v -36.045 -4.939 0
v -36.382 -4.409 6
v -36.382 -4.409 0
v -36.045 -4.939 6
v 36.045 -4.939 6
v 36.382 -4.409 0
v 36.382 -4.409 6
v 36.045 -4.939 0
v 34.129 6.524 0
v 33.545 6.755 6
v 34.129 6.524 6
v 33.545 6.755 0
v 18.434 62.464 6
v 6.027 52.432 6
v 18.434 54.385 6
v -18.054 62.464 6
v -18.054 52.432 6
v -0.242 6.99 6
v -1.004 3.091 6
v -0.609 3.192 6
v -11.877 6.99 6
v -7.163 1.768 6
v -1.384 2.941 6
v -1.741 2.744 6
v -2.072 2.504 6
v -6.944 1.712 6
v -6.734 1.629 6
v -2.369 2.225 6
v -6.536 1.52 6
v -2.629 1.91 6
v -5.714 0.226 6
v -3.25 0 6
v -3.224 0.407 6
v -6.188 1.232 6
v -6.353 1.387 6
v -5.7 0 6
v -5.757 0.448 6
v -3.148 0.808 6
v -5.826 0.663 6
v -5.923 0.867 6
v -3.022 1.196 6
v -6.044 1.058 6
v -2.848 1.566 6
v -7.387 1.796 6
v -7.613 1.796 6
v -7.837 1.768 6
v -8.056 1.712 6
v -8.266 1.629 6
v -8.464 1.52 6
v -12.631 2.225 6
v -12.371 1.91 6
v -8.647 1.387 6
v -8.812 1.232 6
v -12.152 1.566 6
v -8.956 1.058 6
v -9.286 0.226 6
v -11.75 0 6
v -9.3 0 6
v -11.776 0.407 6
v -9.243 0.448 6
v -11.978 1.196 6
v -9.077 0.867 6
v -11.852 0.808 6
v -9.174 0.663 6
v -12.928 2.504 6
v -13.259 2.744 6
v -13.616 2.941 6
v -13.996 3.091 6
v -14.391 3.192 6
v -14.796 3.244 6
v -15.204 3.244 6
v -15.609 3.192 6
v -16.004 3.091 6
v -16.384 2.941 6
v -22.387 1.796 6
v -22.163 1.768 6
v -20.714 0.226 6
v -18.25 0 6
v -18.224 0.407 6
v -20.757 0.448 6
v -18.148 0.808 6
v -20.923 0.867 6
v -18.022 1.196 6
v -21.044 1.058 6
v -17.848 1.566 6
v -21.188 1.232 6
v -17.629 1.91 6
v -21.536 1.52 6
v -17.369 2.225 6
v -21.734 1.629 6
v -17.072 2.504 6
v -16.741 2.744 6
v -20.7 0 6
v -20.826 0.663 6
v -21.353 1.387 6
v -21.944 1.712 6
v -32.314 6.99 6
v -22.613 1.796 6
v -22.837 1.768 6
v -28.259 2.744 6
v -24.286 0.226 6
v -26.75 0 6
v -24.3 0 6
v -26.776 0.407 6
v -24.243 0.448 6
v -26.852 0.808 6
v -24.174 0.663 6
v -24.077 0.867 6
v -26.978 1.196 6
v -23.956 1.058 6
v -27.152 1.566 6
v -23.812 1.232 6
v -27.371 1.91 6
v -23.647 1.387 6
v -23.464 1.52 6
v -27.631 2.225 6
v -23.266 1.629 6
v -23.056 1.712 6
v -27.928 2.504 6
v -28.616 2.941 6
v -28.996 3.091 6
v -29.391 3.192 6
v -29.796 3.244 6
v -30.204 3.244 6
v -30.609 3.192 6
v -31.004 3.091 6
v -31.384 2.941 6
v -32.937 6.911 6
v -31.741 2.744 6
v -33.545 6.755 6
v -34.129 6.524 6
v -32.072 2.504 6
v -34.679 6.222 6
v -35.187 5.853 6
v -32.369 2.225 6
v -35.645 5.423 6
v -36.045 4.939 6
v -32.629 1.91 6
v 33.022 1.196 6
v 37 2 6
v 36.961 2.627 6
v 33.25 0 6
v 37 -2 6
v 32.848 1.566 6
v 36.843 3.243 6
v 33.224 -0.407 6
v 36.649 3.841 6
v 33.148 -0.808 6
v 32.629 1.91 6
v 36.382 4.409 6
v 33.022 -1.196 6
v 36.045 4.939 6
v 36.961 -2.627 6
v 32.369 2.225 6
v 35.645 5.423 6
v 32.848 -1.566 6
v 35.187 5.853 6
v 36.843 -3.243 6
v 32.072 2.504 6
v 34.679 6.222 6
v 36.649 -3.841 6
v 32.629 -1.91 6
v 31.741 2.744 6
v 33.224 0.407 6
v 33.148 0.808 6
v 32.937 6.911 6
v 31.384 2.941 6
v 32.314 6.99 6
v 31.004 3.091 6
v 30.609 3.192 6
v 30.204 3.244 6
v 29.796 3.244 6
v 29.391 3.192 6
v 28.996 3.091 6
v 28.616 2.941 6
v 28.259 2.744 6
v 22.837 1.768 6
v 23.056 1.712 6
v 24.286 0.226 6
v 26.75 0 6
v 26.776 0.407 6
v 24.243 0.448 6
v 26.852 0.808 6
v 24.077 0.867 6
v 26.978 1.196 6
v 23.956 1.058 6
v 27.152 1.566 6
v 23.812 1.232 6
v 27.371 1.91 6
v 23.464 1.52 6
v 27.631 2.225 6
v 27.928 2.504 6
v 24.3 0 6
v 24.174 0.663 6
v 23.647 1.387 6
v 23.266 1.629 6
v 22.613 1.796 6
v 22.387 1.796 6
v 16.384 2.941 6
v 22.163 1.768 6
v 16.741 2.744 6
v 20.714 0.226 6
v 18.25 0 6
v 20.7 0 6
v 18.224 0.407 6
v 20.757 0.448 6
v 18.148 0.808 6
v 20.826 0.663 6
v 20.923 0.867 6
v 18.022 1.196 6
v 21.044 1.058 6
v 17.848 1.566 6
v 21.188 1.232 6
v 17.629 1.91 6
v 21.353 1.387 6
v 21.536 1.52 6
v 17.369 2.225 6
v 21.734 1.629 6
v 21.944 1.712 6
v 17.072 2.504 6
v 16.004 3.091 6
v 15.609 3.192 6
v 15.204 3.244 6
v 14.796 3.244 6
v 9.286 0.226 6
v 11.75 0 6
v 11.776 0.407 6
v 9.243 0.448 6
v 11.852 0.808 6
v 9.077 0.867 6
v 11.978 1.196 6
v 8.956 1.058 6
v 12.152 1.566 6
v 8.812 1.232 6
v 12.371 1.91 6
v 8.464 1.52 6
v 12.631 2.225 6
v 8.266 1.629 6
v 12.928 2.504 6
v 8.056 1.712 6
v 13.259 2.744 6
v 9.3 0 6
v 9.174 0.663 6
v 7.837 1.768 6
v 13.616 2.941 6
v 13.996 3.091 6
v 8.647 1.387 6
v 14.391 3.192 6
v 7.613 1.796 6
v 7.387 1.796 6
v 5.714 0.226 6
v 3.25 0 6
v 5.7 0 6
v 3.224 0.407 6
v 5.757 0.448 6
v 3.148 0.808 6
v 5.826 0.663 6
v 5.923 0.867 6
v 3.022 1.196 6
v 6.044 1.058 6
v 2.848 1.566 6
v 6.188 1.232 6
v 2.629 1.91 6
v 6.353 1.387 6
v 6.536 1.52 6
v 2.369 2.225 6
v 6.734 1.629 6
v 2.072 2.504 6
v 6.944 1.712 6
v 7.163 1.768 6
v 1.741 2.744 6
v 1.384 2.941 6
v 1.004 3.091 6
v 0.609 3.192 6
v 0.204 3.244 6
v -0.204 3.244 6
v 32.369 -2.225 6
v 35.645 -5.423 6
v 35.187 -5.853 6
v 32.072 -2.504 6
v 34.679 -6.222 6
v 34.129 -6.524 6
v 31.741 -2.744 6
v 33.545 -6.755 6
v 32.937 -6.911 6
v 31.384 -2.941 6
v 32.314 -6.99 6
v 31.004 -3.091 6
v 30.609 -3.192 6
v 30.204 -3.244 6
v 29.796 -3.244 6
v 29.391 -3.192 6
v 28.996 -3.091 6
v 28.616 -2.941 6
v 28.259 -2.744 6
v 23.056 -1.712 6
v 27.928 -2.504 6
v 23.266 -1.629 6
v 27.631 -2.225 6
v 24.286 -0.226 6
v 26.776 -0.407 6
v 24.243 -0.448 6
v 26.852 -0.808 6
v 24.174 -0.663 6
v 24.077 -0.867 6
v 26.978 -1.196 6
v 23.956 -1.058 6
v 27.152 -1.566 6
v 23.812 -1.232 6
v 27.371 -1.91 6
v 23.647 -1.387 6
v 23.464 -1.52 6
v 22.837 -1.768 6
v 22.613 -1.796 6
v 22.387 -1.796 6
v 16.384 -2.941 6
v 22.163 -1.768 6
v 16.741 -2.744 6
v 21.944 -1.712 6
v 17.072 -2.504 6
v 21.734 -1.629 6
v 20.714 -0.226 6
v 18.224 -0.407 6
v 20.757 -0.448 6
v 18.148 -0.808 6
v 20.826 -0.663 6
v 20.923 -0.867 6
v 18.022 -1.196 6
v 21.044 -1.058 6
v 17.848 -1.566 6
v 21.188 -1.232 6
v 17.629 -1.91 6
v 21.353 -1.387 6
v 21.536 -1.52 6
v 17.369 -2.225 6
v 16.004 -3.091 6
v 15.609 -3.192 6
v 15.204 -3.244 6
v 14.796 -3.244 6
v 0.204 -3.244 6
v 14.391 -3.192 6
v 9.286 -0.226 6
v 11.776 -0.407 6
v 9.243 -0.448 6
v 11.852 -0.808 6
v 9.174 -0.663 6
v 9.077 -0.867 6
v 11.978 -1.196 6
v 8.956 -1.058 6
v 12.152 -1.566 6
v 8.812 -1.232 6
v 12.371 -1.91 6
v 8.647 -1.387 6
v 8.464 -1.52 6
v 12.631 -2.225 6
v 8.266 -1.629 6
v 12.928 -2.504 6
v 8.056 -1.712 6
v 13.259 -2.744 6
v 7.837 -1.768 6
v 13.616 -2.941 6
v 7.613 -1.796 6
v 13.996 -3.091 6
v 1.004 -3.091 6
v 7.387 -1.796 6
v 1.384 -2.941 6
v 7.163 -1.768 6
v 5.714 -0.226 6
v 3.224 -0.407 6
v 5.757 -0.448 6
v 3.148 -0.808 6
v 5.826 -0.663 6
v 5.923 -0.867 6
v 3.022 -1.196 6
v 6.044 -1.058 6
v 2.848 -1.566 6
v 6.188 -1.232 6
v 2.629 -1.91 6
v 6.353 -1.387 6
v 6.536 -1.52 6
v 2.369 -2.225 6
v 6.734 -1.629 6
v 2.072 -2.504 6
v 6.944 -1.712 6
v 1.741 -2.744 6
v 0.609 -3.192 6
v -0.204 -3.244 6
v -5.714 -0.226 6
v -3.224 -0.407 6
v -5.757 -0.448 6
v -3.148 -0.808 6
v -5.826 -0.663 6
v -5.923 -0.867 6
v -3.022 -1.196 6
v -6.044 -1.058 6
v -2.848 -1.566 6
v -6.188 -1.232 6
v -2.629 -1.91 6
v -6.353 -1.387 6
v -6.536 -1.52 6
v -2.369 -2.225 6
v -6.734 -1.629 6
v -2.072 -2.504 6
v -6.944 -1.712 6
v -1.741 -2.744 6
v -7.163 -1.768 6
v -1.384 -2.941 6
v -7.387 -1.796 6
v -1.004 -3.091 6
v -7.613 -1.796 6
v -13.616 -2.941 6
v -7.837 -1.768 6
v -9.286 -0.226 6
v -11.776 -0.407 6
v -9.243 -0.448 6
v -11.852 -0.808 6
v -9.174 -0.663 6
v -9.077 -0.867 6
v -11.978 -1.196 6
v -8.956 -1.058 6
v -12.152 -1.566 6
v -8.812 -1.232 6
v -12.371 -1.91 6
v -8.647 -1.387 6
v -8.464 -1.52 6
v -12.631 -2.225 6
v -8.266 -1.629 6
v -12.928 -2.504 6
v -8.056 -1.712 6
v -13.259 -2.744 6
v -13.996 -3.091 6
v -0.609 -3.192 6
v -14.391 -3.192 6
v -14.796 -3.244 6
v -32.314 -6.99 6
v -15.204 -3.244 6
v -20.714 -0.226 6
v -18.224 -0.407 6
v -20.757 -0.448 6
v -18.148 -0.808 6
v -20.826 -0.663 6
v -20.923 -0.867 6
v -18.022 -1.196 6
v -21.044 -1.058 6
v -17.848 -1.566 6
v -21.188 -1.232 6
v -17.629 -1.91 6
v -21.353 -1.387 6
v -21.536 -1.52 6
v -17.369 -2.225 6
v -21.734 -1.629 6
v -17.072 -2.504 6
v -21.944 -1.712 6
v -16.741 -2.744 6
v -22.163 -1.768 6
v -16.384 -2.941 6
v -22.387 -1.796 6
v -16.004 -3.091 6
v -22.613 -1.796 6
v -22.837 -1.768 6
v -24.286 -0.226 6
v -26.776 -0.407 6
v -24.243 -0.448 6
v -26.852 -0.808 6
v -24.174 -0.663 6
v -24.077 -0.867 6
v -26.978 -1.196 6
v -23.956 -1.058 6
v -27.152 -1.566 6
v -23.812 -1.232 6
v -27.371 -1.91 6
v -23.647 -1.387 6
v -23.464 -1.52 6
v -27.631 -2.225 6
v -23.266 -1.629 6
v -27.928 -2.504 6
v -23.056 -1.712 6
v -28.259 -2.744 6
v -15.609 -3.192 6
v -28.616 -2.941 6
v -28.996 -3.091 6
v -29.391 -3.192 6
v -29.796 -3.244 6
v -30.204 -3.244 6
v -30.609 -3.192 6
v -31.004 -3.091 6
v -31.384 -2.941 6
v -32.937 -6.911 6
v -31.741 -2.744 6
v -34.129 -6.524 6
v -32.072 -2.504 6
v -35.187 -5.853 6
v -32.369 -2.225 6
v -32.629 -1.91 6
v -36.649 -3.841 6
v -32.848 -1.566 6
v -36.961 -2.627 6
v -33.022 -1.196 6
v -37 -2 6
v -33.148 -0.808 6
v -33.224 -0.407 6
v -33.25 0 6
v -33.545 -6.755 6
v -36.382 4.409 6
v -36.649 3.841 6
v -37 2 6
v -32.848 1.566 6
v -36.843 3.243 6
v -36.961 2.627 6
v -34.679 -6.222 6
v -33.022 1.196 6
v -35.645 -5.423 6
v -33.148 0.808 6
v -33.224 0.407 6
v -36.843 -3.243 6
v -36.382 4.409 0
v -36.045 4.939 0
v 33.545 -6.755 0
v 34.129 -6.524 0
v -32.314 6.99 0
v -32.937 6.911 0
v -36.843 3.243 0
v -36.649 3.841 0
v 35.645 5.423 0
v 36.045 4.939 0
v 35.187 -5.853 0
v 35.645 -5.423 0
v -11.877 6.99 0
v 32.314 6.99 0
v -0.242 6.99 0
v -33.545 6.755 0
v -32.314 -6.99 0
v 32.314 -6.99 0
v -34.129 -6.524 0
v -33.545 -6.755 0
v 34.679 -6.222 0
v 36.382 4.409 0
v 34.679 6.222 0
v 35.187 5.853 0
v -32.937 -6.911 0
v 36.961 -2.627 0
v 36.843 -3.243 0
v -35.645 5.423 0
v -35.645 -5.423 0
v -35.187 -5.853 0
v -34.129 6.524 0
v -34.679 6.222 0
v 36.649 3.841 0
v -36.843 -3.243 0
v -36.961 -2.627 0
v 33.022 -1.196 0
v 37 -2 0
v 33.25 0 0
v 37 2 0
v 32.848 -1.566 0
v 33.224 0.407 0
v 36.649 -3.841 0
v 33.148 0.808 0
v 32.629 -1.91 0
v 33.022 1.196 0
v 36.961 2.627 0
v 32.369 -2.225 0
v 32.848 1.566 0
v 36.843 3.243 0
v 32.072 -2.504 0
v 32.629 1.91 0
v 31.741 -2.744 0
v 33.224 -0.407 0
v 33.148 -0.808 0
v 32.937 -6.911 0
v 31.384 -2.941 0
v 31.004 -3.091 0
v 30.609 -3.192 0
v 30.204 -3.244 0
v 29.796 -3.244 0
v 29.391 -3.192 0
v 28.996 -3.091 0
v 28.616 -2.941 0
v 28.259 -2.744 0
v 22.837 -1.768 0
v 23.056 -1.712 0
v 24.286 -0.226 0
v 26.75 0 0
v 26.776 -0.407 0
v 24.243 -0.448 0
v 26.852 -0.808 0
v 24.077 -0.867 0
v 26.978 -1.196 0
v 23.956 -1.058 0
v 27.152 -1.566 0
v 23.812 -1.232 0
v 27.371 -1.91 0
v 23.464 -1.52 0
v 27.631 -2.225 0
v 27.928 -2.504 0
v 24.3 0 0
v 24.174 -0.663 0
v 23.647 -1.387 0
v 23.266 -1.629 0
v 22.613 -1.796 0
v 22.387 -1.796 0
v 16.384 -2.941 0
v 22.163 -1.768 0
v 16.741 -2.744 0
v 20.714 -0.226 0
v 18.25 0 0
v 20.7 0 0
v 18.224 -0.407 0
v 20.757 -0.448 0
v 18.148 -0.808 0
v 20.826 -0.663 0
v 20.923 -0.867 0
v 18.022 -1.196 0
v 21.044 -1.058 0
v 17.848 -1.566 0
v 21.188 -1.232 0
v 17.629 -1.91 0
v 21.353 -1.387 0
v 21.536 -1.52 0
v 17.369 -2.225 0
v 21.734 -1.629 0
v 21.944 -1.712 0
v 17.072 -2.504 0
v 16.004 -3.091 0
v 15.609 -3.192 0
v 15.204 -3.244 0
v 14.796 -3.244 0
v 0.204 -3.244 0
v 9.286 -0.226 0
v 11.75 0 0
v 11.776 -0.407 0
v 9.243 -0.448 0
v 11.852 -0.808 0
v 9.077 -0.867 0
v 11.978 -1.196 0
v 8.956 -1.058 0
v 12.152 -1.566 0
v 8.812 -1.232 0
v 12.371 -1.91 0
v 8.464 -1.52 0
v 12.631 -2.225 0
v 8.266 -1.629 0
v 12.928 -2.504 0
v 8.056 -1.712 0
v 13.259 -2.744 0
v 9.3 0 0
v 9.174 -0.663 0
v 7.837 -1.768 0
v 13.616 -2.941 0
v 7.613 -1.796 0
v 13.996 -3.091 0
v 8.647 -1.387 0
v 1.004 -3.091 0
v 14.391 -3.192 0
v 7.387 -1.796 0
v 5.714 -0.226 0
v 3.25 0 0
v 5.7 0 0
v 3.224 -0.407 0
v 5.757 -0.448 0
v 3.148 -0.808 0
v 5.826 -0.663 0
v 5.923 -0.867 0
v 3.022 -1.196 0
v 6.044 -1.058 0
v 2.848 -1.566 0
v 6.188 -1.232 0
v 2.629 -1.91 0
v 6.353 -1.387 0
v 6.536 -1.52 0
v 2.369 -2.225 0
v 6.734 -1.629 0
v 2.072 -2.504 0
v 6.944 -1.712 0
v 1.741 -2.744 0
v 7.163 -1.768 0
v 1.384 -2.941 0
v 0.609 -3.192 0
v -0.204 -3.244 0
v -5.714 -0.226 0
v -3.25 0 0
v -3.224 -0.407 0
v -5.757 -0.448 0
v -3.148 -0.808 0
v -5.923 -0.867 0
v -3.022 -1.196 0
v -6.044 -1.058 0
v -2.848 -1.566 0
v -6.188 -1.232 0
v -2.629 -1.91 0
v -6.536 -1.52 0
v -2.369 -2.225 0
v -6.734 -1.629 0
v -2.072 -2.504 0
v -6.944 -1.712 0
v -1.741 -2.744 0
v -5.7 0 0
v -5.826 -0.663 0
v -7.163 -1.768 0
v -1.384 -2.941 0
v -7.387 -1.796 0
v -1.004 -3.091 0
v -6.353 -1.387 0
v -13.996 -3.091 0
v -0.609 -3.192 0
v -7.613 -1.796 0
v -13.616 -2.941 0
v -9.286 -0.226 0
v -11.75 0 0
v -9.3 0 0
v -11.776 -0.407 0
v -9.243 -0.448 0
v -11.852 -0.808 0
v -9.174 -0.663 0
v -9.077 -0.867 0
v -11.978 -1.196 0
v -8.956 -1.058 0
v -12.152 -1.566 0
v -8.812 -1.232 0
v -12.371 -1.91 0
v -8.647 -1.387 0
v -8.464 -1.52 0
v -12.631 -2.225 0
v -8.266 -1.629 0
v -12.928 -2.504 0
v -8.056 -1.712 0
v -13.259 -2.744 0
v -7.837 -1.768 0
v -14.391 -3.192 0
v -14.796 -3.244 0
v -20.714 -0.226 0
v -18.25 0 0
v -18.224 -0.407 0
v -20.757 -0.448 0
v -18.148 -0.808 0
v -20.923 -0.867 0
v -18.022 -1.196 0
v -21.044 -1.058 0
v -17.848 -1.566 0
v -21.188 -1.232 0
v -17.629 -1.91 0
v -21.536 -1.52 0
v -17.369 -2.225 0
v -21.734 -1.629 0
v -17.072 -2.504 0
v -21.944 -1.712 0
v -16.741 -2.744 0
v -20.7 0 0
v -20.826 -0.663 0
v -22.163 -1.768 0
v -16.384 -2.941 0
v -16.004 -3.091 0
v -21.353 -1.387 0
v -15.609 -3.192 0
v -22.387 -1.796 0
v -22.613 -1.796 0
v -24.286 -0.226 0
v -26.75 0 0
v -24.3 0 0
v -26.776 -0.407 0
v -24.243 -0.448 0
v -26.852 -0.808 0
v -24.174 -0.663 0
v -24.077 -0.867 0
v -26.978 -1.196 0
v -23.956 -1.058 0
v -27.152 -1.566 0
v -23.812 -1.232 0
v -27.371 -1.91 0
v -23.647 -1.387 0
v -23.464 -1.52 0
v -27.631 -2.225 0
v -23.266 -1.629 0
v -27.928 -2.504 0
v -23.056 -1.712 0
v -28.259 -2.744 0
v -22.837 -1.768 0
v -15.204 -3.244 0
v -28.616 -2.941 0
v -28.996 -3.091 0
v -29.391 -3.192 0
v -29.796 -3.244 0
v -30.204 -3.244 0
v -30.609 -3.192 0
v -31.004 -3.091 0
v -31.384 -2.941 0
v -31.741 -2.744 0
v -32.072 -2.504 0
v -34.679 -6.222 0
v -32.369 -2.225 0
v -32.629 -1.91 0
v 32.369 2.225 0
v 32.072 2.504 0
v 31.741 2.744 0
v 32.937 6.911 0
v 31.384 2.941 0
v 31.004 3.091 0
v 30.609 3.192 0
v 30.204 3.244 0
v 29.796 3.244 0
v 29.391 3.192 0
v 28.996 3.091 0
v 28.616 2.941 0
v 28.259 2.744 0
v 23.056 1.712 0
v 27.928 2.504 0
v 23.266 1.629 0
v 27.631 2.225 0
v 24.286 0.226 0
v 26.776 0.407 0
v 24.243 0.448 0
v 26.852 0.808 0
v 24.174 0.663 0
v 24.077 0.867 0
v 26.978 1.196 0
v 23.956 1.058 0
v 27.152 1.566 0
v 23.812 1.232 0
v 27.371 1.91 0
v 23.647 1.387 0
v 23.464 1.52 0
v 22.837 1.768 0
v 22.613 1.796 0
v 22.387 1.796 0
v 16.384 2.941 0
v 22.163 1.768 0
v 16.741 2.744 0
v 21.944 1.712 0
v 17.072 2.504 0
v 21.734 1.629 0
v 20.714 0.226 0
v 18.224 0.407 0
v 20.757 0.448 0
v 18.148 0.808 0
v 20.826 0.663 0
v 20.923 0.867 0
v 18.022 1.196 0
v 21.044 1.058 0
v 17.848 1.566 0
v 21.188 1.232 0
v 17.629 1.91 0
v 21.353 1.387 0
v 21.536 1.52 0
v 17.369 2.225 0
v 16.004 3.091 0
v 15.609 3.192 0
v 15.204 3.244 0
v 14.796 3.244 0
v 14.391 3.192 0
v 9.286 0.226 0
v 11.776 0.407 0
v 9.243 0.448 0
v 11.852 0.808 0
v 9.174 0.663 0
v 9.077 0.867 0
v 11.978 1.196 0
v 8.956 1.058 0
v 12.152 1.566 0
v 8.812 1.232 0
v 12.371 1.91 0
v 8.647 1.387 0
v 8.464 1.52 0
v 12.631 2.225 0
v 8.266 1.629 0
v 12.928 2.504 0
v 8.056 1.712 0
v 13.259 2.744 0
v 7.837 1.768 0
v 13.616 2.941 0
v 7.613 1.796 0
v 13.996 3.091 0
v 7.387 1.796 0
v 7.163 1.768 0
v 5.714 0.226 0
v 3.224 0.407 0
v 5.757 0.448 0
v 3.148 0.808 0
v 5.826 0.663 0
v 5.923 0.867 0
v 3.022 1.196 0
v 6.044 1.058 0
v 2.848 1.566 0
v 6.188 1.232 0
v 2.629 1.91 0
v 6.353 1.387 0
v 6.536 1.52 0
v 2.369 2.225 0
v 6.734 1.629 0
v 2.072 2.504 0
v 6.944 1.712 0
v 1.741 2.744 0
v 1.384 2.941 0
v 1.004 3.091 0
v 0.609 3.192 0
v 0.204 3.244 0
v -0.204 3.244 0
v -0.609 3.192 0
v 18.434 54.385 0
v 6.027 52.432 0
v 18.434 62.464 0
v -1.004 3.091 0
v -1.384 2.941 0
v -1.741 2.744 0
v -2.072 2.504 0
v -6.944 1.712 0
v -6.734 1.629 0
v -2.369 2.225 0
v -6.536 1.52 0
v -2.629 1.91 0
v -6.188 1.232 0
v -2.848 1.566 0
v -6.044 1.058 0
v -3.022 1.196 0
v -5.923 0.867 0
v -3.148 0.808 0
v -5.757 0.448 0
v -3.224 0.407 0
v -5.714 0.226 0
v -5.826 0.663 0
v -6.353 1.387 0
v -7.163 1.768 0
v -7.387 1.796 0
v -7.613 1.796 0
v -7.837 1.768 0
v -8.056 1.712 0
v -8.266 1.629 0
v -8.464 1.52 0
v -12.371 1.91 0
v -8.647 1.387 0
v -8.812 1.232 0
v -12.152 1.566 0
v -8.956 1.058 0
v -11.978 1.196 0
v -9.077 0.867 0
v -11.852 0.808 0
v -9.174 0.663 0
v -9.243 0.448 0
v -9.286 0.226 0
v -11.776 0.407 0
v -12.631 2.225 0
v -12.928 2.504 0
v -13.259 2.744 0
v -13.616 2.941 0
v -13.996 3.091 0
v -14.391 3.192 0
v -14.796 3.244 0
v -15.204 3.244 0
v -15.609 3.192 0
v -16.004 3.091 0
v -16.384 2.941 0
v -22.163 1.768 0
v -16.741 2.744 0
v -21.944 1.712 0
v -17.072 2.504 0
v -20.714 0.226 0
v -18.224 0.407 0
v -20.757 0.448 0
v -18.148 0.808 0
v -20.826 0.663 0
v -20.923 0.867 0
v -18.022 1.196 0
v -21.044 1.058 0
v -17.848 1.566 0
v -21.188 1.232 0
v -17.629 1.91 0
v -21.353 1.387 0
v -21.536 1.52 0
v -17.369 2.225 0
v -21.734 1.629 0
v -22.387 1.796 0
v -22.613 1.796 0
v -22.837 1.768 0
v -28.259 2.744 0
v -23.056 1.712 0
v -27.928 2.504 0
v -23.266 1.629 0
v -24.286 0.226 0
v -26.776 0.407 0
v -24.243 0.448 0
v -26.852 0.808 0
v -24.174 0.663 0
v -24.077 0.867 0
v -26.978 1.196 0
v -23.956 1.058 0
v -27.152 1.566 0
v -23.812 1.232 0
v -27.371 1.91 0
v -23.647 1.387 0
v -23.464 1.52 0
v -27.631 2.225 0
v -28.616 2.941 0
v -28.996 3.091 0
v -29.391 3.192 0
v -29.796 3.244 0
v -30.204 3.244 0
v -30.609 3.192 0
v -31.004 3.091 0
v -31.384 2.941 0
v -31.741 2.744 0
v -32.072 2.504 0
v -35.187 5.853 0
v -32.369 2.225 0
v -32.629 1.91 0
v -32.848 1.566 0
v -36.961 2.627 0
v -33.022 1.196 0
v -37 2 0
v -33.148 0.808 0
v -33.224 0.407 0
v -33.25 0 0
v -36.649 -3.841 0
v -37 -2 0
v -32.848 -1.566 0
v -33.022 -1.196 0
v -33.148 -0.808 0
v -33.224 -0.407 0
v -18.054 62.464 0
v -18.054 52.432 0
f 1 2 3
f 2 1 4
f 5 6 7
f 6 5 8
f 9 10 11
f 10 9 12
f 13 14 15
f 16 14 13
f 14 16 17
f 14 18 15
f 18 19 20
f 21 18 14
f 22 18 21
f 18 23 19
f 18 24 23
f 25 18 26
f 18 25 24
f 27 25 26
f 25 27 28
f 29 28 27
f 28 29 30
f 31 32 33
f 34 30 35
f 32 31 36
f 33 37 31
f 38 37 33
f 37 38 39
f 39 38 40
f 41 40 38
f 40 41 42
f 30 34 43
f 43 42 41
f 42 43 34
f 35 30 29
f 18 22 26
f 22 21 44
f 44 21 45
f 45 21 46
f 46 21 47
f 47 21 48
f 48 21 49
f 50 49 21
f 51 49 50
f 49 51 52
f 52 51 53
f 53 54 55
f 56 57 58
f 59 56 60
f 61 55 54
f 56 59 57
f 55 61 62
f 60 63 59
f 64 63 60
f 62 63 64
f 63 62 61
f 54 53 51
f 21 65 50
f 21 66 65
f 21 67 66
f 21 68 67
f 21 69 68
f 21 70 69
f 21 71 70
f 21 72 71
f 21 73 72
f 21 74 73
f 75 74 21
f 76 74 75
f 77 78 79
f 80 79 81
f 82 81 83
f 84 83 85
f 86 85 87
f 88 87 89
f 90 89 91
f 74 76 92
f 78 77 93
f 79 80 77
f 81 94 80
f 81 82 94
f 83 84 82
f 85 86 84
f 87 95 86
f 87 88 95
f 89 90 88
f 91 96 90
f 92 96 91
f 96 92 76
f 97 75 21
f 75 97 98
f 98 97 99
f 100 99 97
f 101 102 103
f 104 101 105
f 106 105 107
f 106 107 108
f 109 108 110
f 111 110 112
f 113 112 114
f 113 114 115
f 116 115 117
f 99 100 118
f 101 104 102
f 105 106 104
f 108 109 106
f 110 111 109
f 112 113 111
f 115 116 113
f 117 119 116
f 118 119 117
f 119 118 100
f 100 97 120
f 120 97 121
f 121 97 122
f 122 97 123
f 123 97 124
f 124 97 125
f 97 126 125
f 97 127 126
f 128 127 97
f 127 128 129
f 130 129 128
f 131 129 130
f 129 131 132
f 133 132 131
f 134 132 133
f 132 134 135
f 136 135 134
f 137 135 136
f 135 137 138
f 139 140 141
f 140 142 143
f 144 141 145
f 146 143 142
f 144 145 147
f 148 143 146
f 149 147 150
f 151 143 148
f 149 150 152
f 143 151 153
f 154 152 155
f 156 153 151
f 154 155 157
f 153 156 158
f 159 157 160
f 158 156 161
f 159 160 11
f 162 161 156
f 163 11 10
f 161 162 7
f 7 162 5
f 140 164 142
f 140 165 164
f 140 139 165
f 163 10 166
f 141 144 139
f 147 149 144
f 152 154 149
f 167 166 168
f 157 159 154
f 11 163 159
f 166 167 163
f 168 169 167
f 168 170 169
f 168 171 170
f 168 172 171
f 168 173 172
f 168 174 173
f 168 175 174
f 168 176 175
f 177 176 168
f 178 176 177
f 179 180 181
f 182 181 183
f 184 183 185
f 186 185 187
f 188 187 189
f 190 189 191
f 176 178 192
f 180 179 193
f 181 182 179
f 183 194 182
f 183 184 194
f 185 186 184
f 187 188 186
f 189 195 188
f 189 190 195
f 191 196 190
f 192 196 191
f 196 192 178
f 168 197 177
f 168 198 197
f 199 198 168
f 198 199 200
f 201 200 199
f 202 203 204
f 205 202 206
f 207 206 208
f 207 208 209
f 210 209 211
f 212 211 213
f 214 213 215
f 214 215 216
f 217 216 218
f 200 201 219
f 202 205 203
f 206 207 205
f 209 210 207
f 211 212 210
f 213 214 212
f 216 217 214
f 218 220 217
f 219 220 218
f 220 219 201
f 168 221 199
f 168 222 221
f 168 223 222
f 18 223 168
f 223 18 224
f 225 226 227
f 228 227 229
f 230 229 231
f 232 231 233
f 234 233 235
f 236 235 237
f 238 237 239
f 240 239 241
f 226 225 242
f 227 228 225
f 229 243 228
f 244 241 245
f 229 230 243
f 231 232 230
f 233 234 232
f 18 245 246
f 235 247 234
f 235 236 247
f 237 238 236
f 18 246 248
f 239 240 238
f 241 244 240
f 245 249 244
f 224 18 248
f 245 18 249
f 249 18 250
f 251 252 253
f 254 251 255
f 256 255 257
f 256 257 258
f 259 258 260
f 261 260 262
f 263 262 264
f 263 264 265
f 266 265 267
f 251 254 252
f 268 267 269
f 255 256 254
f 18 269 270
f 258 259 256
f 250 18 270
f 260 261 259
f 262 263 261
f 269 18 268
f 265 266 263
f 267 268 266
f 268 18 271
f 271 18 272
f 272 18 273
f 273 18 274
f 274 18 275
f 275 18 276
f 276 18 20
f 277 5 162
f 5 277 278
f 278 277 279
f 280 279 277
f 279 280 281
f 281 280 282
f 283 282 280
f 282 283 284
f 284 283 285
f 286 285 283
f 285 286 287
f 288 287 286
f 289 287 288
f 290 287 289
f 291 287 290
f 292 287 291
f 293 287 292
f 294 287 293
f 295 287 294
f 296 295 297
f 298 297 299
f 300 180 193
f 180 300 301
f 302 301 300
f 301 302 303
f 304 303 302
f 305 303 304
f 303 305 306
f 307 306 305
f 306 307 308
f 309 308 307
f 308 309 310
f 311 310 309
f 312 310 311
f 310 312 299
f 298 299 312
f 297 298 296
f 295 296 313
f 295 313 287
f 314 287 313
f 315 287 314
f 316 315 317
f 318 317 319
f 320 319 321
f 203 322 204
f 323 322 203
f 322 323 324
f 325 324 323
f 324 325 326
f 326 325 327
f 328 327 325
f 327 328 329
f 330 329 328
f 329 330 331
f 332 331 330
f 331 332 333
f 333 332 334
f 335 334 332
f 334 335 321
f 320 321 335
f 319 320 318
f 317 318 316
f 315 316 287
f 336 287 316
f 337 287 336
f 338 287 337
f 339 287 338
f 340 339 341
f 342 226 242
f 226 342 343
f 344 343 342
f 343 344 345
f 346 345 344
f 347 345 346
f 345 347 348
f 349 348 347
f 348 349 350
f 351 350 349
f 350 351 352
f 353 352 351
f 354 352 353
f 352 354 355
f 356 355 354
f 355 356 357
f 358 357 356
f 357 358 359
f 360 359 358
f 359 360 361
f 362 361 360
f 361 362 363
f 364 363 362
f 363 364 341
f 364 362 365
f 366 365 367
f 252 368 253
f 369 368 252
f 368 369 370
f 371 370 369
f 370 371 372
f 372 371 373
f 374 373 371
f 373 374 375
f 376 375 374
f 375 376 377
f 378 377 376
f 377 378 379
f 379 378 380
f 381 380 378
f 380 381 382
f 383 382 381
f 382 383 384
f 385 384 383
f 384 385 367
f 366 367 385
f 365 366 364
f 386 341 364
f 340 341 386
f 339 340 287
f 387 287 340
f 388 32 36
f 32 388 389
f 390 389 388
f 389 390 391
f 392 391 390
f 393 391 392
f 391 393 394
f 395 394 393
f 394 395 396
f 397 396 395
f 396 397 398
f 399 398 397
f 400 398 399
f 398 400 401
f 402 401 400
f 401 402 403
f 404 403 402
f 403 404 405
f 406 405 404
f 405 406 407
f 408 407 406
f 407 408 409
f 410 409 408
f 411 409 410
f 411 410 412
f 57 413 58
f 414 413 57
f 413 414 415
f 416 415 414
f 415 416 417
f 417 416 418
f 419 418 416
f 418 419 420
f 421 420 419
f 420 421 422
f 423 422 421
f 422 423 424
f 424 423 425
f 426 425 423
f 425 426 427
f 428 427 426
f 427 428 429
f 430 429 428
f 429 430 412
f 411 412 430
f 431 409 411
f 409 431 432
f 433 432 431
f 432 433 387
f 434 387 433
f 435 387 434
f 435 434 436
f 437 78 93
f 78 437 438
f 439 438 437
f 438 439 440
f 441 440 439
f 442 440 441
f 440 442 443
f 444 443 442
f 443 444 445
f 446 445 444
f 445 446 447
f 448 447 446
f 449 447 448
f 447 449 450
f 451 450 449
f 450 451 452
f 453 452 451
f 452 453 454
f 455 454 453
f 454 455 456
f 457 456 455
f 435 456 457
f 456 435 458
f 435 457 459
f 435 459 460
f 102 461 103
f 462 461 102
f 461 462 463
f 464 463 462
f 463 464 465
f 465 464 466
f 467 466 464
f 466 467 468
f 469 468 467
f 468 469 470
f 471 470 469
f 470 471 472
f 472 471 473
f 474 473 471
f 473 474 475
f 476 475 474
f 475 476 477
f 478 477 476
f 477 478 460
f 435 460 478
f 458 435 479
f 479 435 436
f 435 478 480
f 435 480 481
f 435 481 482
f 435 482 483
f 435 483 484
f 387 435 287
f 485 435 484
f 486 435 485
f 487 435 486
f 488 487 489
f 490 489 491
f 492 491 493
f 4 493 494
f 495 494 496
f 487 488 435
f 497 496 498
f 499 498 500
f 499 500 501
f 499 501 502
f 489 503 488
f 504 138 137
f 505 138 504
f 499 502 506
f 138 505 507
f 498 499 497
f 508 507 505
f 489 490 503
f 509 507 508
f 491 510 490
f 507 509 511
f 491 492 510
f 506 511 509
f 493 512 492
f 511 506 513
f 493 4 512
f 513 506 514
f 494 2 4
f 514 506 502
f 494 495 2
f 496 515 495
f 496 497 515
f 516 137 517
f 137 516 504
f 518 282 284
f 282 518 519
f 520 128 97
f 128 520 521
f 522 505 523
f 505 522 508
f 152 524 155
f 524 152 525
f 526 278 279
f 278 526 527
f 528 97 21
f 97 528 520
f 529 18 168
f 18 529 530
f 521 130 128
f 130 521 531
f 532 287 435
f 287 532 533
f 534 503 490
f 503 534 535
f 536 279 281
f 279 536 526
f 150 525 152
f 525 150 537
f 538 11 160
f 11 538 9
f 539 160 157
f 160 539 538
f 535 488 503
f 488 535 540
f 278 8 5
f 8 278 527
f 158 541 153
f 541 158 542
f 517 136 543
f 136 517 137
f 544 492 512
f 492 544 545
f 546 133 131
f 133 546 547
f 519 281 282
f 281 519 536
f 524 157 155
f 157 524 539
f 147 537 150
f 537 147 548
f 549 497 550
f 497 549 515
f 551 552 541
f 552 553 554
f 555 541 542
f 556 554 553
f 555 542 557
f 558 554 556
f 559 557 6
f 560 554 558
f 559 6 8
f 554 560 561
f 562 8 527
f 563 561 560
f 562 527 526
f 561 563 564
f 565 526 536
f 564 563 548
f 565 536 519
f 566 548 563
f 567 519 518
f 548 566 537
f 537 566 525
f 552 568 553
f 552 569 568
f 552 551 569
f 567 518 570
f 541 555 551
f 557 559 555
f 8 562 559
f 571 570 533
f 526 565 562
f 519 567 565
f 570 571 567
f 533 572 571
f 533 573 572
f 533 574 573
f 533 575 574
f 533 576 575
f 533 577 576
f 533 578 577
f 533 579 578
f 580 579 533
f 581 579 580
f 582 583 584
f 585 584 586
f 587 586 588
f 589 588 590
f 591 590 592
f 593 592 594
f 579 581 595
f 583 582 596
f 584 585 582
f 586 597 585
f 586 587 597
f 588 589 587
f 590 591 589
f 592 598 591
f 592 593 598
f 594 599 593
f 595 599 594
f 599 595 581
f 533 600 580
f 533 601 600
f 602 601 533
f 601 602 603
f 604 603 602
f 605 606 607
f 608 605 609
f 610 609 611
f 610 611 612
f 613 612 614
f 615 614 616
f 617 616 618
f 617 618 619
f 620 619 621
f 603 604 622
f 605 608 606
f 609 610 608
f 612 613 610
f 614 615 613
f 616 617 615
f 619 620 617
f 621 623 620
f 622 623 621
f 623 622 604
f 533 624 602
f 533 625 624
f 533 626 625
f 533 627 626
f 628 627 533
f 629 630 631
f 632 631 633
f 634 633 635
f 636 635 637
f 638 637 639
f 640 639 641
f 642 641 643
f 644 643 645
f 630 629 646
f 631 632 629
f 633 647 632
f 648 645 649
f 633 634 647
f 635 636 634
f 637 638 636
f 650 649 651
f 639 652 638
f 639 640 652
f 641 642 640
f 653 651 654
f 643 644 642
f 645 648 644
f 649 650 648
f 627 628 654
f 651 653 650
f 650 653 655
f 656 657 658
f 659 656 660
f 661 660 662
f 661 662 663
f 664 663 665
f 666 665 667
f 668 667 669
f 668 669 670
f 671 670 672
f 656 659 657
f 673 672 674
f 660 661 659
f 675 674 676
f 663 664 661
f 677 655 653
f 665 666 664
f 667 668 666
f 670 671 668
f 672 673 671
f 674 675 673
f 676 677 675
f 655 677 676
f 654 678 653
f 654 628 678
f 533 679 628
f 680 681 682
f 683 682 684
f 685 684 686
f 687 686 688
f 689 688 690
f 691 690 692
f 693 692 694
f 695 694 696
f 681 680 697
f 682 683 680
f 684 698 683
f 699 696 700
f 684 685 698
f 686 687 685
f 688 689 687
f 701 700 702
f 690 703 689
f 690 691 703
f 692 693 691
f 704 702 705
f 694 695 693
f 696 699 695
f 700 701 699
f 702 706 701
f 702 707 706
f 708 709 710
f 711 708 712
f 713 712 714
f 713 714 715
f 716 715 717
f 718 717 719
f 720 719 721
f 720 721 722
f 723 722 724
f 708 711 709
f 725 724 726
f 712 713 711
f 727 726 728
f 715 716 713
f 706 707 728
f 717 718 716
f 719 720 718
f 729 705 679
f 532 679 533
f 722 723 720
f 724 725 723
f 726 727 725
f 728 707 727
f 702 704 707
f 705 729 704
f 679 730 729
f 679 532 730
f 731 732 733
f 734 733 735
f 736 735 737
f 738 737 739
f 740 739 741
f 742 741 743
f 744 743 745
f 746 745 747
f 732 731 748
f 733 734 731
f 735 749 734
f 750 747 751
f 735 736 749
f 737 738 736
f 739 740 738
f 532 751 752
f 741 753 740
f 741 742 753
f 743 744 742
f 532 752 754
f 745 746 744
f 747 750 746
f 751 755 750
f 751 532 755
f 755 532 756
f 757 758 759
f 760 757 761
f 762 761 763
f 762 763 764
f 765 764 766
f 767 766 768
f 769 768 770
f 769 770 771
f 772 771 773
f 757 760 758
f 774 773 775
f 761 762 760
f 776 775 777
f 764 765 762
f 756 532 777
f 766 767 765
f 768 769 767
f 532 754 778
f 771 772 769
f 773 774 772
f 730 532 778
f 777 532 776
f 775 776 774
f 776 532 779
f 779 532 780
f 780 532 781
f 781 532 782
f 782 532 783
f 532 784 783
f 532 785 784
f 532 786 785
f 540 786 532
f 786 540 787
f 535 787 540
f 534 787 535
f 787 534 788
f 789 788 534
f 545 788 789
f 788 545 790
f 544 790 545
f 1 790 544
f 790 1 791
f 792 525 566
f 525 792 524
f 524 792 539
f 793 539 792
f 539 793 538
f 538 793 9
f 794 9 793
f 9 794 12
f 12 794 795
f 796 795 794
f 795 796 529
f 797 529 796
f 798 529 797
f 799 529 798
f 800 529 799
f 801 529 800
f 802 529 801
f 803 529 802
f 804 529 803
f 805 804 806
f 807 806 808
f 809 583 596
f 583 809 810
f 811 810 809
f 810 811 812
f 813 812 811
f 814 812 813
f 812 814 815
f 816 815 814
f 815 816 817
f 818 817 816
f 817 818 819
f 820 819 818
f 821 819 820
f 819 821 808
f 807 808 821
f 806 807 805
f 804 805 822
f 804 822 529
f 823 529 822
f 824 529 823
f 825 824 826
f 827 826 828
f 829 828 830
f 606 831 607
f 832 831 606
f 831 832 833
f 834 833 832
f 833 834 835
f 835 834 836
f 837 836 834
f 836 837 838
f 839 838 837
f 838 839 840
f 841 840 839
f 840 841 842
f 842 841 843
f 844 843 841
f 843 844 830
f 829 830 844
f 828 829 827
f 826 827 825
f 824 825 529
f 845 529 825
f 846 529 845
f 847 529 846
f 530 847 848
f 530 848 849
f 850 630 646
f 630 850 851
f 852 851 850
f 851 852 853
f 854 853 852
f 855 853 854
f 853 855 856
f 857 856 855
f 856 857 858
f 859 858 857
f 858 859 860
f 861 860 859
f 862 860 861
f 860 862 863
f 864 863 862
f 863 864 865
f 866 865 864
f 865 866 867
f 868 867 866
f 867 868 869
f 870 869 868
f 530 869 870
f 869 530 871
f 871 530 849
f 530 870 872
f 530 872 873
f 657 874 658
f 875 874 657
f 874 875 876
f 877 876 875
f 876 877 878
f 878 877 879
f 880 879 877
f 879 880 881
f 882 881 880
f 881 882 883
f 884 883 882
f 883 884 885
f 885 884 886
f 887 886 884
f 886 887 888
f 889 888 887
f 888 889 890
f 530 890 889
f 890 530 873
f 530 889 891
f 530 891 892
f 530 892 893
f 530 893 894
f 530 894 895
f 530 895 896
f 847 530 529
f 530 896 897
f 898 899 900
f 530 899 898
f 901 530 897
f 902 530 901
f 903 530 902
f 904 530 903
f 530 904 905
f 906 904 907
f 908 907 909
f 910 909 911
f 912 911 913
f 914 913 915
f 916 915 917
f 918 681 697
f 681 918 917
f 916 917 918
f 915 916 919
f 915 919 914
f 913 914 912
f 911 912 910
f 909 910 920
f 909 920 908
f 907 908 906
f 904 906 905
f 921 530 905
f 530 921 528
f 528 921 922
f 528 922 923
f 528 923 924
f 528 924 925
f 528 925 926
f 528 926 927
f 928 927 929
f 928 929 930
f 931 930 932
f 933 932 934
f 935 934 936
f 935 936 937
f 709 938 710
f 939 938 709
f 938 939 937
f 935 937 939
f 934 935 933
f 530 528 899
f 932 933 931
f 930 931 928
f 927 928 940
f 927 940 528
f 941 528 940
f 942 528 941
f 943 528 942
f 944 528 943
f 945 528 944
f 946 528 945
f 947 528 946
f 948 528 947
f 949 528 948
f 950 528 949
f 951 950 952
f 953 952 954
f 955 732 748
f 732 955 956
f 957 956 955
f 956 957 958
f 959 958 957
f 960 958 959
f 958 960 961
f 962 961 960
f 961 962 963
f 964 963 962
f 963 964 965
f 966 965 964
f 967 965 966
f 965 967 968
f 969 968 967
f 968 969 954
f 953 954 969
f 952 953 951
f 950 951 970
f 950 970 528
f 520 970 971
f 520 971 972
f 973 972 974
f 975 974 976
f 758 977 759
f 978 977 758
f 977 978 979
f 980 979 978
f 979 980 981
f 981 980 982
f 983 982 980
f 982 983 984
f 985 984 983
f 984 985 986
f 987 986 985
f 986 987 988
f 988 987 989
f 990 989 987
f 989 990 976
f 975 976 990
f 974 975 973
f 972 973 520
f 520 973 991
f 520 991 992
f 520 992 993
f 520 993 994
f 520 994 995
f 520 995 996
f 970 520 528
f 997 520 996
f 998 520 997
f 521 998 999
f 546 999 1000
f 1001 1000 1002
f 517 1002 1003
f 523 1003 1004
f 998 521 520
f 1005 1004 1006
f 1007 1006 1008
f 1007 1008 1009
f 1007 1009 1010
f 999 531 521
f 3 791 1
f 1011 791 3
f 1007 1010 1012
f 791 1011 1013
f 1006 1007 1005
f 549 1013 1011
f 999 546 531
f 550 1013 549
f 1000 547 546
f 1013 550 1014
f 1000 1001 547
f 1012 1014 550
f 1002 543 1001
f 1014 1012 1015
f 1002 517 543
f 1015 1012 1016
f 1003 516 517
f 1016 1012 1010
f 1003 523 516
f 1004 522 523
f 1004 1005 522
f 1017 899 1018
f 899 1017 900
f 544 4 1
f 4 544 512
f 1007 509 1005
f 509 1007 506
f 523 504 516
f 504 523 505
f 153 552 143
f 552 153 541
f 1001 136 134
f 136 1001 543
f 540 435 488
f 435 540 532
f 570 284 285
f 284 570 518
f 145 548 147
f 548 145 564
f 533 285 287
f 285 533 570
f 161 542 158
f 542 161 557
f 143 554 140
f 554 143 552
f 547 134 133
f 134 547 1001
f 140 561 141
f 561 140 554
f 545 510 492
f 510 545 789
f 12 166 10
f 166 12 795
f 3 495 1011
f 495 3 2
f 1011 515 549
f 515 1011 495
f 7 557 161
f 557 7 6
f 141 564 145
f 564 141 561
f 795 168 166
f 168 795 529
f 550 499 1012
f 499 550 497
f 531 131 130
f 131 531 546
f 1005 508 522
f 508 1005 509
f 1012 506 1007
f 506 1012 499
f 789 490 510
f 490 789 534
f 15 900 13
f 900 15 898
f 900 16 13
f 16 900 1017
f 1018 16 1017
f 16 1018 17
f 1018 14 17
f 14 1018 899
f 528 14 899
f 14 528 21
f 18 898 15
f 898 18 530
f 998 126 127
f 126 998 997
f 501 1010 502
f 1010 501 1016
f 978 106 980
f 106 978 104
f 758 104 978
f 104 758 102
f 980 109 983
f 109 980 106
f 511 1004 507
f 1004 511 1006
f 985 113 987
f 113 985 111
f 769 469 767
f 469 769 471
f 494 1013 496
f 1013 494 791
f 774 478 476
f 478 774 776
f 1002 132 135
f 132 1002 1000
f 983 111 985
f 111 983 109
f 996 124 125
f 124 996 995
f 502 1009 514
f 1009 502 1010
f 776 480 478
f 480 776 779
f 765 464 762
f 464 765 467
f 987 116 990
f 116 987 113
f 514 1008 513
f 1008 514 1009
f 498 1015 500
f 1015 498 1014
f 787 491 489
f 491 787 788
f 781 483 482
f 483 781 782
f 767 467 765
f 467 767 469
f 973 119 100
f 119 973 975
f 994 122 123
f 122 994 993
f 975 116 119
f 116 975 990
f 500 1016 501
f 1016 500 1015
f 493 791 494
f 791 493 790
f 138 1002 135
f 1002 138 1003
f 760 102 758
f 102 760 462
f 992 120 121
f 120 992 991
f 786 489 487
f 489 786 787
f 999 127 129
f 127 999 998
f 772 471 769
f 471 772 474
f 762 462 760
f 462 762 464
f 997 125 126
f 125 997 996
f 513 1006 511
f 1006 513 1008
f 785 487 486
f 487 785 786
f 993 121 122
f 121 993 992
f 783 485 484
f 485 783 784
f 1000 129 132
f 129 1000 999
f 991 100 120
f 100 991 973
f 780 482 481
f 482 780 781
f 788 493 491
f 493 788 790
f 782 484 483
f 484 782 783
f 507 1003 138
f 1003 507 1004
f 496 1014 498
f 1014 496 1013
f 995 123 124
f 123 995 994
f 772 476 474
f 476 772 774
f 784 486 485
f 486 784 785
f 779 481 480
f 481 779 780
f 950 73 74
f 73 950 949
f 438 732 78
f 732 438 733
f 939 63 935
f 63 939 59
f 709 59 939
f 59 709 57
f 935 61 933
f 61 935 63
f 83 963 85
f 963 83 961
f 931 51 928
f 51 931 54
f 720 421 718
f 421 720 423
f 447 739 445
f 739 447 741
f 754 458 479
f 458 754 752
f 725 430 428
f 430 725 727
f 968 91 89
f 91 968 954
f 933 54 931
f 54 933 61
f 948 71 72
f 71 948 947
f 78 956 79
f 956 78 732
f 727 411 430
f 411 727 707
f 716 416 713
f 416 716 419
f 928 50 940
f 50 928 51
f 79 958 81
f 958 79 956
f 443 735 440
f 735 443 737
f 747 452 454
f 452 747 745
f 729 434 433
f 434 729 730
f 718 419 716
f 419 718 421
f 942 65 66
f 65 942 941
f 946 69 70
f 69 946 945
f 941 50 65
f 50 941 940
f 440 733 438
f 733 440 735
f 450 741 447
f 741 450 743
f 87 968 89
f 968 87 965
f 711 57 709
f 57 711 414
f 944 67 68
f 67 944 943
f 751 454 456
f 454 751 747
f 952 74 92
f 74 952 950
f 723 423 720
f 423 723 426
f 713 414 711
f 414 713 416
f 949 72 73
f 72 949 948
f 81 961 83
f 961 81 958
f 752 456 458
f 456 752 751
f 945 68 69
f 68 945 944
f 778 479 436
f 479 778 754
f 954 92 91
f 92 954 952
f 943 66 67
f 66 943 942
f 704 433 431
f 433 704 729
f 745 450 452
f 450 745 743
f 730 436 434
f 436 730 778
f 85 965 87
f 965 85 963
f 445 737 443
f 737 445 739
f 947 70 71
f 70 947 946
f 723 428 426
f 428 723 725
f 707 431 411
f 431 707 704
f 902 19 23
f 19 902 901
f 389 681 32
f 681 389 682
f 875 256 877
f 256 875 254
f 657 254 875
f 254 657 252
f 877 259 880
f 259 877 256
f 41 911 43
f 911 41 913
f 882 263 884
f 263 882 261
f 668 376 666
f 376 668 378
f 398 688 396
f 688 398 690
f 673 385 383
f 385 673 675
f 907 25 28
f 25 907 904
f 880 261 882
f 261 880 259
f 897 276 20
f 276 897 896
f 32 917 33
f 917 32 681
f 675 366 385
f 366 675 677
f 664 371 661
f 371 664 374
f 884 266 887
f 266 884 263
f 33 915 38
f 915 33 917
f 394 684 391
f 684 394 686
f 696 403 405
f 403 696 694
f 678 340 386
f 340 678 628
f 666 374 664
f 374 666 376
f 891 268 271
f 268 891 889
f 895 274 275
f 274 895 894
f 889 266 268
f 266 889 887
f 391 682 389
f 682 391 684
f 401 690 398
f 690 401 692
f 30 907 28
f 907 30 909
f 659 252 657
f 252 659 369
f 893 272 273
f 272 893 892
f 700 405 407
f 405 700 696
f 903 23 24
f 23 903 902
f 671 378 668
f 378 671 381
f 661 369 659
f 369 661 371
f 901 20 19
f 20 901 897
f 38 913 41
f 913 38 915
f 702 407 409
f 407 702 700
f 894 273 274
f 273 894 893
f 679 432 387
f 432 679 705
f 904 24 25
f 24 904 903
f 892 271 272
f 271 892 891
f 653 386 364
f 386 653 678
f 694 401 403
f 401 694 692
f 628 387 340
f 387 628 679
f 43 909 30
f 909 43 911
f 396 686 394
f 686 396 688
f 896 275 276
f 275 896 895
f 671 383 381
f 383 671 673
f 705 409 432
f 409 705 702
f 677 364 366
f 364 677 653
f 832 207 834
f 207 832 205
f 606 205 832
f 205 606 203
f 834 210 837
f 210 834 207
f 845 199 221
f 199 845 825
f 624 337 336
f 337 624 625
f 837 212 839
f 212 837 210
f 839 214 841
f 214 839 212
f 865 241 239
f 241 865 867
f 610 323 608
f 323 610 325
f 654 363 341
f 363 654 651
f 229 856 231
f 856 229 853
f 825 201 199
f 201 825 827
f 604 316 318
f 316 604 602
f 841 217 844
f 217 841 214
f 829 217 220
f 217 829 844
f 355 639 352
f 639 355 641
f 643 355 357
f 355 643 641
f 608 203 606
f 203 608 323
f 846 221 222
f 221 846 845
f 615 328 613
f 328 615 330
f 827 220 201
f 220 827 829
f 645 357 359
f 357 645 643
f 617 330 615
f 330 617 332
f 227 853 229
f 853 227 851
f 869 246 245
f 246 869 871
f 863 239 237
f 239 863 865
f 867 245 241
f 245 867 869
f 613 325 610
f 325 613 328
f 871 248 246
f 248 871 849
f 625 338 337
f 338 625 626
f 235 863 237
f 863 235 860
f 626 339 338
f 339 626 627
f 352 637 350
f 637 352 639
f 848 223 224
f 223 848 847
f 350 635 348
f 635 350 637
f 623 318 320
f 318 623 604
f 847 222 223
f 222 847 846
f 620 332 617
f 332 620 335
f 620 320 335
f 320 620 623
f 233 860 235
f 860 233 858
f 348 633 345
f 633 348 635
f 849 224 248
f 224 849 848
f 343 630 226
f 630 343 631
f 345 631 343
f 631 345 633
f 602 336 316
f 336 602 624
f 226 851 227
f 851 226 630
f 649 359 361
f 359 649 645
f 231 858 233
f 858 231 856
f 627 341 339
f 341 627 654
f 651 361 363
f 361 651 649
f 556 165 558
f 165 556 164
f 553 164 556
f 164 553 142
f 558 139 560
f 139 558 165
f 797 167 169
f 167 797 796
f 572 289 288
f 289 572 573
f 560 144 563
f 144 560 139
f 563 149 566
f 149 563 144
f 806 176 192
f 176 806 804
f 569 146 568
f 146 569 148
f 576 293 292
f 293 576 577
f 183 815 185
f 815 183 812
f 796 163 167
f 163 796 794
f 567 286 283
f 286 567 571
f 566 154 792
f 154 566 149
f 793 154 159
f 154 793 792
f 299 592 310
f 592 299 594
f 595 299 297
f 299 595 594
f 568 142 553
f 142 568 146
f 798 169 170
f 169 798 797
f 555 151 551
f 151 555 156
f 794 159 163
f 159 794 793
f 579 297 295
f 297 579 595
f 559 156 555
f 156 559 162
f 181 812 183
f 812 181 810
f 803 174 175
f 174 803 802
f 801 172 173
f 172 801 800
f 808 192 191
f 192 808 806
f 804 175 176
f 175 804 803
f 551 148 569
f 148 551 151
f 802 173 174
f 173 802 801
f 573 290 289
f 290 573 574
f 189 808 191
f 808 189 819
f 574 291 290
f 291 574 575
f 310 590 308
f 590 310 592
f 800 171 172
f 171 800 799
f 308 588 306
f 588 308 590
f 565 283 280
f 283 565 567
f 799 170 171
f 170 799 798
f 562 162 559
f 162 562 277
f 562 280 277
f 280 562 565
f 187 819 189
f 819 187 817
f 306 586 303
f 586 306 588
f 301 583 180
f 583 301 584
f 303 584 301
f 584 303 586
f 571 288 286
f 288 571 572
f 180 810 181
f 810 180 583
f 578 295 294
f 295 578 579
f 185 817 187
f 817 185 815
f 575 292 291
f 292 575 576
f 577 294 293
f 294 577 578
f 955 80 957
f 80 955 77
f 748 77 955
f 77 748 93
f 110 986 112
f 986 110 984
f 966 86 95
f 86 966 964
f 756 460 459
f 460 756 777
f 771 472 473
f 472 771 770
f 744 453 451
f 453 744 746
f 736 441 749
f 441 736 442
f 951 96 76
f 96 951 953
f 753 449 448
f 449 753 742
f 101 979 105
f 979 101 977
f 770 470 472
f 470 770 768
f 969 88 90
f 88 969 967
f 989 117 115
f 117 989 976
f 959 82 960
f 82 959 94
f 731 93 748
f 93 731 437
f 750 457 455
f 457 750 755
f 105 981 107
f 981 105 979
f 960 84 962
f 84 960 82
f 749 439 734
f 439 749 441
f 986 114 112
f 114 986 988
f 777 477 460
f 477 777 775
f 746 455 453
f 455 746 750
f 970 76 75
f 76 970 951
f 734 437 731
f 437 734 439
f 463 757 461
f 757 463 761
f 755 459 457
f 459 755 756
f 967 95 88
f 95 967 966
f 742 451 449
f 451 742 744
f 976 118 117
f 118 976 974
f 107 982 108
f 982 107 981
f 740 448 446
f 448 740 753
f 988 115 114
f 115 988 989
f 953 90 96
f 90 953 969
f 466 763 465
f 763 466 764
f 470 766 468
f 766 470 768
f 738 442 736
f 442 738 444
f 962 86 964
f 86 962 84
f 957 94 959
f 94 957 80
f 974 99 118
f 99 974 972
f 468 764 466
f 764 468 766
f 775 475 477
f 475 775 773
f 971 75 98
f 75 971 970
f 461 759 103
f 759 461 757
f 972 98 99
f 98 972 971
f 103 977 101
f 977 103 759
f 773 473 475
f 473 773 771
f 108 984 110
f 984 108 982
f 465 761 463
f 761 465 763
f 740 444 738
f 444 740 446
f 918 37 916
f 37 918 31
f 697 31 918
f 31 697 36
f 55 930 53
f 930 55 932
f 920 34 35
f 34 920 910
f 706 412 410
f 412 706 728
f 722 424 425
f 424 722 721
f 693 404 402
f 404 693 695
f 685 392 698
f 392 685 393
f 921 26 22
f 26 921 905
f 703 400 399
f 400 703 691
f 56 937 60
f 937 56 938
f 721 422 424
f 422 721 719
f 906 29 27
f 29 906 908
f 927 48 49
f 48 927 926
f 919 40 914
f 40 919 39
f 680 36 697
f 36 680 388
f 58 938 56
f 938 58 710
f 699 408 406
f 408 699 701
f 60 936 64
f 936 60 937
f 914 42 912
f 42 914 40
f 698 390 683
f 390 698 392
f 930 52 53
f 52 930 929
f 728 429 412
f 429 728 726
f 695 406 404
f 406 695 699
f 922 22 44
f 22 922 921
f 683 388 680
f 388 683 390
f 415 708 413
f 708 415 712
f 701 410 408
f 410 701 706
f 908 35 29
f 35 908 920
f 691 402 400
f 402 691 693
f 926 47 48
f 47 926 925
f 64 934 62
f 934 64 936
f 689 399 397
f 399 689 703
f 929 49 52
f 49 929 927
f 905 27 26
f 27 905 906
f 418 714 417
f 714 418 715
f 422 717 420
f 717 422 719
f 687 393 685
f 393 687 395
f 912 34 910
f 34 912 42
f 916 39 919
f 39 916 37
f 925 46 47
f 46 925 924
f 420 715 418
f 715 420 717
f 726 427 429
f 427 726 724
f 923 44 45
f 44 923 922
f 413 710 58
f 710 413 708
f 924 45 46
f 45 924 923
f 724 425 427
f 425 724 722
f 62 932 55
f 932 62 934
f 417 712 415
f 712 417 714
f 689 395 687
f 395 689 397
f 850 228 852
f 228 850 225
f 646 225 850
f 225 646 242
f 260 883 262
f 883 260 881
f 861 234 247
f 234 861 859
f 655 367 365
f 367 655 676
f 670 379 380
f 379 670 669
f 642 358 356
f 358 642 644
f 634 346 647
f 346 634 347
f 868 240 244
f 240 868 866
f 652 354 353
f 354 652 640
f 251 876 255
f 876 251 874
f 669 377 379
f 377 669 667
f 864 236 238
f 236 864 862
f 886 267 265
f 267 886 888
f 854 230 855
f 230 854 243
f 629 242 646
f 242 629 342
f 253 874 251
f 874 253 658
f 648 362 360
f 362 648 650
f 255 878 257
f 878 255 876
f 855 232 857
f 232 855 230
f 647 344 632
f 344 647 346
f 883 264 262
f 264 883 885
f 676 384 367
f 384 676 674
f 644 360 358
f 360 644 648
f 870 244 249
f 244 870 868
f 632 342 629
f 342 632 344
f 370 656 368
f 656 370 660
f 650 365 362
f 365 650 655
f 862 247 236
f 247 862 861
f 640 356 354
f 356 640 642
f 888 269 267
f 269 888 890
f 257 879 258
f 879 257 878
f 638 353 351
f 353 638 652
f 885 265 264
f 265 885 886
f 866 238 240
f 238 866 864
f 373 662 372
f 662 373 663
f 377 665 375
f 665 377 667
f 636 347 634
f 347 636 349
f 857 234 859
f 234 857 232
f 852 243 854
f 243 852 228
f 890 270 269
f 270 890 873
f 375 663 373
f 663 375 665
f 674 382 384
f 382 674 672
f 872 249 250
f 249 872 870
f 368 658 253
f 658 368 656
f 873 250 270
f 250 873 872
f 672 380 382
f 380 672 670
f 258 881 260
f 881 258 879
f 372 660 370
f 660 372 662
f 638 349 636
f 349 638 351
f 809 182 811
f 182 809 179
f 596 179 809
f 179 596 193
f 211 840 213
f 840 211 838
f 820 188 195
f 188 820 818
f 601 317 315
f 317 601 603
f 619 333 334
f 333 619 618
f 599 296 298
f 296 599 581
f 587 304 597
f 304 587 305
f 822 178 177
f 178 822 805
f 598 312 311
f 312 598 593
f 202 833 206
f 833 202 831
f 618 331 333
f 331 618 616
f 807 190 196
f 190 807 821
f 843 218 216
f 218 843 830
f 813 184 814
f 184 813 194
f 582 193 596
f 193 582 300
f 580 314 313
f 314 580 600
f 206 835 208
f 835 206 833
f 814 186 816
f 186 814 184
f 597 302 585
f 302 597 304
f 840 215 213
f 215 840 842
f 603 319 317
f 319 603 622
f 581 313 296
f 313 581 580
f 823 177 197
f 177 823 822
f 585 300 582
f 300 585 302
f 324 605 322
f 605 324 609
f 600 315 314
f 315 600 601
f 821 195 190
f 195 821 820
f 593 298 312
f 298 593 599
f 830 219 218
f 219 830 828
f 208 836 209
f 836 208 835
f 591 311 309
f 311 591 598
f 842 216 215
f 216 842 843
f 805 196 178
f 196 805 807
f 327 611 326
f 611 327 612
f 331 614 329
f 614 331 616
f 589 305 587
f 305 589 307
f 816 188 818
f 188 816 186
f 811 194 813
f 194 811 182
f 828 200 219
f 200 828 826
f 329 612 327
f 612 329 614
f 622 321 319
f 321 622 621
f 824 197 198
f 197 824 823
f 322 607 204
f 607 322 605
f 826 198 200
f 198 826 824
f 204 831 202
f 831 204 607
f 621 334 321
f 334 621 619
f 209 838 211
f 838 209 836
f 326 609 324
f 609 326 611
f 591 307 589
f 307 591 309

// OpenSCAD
$fn = 50;


difference() {
	union() {
		hull() {
			translate(v = [-32.0000000000, 2.0000000000, 0]) {
				cylinder(h = 6, r = 5);
			}
			translate(v = [32.0000000000, 2.0000000000, 0]) {
				cylinder(h = 6, r = 5);
			}
			translate(v = [-32.0000000000, -2.0000000000, 0]) {
				cylinder(h = 6, r = 5);
			}
			translate(v = [32.0000000000, -2.0000000000, 0]) {
				cylinder(h = 6, r = 5);
			}
		}
		translate(v = [0, 61.1111111111, 0]) {
			linear_extrude(height = 6) {
				text(font = "DejaVu Sans Mono:style=Bold", halign = "center", size = 57.0000000000, text = "7", valign = "top");
			}
		}
	}
	union() {
		translate(v = [-30.0000000000, 0.0000000000, 0]) {
			translate(v = [0, 0, -100]) {
				cylinder(h = 200, r = 3.2500000000);
			}
		}
		translate(v = [-15.0000000000, 0.0000000000, 0]) {
			translate(v = [0, 0, -100]) {
				cylinder(h = 200, r = 3.2500000000);
			}
		}
		translate(v = [0, 0, -100]) {
			cylinder(h = 200, r = 3.2500000000);
		}
		translate(v = [15.0000000000, 0.0000000000, 0]) {
			translate(v = [0, 0, -100]) {
				cylinder(h = 200, r = 3.2500000000);
			}
		}
		translate(v = [30.0000000000, 0.0000000000, 0]) {
			translate(v = [0, 0, -100]) {
				cylinder(h = 200, r = 3.2500000000);
			}
		}
		translate(v = [-30.0000000000, 0.0000000000, 0]) {
			translate(v = [0, 0, -100]) {
				cylinder(h = 200, r = 1.8000000000);
			}
		}
		translate(v = [-22.5000000000, 0.0000000000, 0]) {
			translate(v = [0, 0, -100]) {
				cylinder(h = 200, r = 1.8000000000);
			}
		}
		translate(v = [-15.0000000000, 0.0000000000, 0]) {
			translate(v = [0, 0, -100]) {
				cylinder(h = 200, r = 1.8000000000);
			}
		}
		translate(v = [-7.5000000000, 0.0000000000, 0]) {
			translate(v = [0, 0, -100]) {
				cylinder(h = 200, r = 1.8000000000);
			}
		}
		translate(v = [0, 0, -100]) {
			cylinder(h = 200, r = 1.8000000000);
		}
		translate(v = [7.5000000000, 0.0000000000, 0]) {
			translate(v = [0, 0, -100]) {
				cylinder(h = 200, r = 1.8000000000);
			}
		}
		translate(v = [15.0000000000, 0.0000000000, 0]) {
			translate(v = [0, 0, -100]) {
				cylinder(h = 200, r = 1.8000000000);
			}
		}
		translate(v = [22.5000000000, 0.0000000000, 0]) {
			translate(v = [0, 0, -100]) {
				cylinder(h = 200, r = 1.8000000000);
			}
		}
		translate(v = [30.0000000000, 0.0000000000, 0]) {
			translate(v = [0, 0, -100]) {
				cylinder(h = 200, r = 1.8000000000);
			}
		}
	}
}
